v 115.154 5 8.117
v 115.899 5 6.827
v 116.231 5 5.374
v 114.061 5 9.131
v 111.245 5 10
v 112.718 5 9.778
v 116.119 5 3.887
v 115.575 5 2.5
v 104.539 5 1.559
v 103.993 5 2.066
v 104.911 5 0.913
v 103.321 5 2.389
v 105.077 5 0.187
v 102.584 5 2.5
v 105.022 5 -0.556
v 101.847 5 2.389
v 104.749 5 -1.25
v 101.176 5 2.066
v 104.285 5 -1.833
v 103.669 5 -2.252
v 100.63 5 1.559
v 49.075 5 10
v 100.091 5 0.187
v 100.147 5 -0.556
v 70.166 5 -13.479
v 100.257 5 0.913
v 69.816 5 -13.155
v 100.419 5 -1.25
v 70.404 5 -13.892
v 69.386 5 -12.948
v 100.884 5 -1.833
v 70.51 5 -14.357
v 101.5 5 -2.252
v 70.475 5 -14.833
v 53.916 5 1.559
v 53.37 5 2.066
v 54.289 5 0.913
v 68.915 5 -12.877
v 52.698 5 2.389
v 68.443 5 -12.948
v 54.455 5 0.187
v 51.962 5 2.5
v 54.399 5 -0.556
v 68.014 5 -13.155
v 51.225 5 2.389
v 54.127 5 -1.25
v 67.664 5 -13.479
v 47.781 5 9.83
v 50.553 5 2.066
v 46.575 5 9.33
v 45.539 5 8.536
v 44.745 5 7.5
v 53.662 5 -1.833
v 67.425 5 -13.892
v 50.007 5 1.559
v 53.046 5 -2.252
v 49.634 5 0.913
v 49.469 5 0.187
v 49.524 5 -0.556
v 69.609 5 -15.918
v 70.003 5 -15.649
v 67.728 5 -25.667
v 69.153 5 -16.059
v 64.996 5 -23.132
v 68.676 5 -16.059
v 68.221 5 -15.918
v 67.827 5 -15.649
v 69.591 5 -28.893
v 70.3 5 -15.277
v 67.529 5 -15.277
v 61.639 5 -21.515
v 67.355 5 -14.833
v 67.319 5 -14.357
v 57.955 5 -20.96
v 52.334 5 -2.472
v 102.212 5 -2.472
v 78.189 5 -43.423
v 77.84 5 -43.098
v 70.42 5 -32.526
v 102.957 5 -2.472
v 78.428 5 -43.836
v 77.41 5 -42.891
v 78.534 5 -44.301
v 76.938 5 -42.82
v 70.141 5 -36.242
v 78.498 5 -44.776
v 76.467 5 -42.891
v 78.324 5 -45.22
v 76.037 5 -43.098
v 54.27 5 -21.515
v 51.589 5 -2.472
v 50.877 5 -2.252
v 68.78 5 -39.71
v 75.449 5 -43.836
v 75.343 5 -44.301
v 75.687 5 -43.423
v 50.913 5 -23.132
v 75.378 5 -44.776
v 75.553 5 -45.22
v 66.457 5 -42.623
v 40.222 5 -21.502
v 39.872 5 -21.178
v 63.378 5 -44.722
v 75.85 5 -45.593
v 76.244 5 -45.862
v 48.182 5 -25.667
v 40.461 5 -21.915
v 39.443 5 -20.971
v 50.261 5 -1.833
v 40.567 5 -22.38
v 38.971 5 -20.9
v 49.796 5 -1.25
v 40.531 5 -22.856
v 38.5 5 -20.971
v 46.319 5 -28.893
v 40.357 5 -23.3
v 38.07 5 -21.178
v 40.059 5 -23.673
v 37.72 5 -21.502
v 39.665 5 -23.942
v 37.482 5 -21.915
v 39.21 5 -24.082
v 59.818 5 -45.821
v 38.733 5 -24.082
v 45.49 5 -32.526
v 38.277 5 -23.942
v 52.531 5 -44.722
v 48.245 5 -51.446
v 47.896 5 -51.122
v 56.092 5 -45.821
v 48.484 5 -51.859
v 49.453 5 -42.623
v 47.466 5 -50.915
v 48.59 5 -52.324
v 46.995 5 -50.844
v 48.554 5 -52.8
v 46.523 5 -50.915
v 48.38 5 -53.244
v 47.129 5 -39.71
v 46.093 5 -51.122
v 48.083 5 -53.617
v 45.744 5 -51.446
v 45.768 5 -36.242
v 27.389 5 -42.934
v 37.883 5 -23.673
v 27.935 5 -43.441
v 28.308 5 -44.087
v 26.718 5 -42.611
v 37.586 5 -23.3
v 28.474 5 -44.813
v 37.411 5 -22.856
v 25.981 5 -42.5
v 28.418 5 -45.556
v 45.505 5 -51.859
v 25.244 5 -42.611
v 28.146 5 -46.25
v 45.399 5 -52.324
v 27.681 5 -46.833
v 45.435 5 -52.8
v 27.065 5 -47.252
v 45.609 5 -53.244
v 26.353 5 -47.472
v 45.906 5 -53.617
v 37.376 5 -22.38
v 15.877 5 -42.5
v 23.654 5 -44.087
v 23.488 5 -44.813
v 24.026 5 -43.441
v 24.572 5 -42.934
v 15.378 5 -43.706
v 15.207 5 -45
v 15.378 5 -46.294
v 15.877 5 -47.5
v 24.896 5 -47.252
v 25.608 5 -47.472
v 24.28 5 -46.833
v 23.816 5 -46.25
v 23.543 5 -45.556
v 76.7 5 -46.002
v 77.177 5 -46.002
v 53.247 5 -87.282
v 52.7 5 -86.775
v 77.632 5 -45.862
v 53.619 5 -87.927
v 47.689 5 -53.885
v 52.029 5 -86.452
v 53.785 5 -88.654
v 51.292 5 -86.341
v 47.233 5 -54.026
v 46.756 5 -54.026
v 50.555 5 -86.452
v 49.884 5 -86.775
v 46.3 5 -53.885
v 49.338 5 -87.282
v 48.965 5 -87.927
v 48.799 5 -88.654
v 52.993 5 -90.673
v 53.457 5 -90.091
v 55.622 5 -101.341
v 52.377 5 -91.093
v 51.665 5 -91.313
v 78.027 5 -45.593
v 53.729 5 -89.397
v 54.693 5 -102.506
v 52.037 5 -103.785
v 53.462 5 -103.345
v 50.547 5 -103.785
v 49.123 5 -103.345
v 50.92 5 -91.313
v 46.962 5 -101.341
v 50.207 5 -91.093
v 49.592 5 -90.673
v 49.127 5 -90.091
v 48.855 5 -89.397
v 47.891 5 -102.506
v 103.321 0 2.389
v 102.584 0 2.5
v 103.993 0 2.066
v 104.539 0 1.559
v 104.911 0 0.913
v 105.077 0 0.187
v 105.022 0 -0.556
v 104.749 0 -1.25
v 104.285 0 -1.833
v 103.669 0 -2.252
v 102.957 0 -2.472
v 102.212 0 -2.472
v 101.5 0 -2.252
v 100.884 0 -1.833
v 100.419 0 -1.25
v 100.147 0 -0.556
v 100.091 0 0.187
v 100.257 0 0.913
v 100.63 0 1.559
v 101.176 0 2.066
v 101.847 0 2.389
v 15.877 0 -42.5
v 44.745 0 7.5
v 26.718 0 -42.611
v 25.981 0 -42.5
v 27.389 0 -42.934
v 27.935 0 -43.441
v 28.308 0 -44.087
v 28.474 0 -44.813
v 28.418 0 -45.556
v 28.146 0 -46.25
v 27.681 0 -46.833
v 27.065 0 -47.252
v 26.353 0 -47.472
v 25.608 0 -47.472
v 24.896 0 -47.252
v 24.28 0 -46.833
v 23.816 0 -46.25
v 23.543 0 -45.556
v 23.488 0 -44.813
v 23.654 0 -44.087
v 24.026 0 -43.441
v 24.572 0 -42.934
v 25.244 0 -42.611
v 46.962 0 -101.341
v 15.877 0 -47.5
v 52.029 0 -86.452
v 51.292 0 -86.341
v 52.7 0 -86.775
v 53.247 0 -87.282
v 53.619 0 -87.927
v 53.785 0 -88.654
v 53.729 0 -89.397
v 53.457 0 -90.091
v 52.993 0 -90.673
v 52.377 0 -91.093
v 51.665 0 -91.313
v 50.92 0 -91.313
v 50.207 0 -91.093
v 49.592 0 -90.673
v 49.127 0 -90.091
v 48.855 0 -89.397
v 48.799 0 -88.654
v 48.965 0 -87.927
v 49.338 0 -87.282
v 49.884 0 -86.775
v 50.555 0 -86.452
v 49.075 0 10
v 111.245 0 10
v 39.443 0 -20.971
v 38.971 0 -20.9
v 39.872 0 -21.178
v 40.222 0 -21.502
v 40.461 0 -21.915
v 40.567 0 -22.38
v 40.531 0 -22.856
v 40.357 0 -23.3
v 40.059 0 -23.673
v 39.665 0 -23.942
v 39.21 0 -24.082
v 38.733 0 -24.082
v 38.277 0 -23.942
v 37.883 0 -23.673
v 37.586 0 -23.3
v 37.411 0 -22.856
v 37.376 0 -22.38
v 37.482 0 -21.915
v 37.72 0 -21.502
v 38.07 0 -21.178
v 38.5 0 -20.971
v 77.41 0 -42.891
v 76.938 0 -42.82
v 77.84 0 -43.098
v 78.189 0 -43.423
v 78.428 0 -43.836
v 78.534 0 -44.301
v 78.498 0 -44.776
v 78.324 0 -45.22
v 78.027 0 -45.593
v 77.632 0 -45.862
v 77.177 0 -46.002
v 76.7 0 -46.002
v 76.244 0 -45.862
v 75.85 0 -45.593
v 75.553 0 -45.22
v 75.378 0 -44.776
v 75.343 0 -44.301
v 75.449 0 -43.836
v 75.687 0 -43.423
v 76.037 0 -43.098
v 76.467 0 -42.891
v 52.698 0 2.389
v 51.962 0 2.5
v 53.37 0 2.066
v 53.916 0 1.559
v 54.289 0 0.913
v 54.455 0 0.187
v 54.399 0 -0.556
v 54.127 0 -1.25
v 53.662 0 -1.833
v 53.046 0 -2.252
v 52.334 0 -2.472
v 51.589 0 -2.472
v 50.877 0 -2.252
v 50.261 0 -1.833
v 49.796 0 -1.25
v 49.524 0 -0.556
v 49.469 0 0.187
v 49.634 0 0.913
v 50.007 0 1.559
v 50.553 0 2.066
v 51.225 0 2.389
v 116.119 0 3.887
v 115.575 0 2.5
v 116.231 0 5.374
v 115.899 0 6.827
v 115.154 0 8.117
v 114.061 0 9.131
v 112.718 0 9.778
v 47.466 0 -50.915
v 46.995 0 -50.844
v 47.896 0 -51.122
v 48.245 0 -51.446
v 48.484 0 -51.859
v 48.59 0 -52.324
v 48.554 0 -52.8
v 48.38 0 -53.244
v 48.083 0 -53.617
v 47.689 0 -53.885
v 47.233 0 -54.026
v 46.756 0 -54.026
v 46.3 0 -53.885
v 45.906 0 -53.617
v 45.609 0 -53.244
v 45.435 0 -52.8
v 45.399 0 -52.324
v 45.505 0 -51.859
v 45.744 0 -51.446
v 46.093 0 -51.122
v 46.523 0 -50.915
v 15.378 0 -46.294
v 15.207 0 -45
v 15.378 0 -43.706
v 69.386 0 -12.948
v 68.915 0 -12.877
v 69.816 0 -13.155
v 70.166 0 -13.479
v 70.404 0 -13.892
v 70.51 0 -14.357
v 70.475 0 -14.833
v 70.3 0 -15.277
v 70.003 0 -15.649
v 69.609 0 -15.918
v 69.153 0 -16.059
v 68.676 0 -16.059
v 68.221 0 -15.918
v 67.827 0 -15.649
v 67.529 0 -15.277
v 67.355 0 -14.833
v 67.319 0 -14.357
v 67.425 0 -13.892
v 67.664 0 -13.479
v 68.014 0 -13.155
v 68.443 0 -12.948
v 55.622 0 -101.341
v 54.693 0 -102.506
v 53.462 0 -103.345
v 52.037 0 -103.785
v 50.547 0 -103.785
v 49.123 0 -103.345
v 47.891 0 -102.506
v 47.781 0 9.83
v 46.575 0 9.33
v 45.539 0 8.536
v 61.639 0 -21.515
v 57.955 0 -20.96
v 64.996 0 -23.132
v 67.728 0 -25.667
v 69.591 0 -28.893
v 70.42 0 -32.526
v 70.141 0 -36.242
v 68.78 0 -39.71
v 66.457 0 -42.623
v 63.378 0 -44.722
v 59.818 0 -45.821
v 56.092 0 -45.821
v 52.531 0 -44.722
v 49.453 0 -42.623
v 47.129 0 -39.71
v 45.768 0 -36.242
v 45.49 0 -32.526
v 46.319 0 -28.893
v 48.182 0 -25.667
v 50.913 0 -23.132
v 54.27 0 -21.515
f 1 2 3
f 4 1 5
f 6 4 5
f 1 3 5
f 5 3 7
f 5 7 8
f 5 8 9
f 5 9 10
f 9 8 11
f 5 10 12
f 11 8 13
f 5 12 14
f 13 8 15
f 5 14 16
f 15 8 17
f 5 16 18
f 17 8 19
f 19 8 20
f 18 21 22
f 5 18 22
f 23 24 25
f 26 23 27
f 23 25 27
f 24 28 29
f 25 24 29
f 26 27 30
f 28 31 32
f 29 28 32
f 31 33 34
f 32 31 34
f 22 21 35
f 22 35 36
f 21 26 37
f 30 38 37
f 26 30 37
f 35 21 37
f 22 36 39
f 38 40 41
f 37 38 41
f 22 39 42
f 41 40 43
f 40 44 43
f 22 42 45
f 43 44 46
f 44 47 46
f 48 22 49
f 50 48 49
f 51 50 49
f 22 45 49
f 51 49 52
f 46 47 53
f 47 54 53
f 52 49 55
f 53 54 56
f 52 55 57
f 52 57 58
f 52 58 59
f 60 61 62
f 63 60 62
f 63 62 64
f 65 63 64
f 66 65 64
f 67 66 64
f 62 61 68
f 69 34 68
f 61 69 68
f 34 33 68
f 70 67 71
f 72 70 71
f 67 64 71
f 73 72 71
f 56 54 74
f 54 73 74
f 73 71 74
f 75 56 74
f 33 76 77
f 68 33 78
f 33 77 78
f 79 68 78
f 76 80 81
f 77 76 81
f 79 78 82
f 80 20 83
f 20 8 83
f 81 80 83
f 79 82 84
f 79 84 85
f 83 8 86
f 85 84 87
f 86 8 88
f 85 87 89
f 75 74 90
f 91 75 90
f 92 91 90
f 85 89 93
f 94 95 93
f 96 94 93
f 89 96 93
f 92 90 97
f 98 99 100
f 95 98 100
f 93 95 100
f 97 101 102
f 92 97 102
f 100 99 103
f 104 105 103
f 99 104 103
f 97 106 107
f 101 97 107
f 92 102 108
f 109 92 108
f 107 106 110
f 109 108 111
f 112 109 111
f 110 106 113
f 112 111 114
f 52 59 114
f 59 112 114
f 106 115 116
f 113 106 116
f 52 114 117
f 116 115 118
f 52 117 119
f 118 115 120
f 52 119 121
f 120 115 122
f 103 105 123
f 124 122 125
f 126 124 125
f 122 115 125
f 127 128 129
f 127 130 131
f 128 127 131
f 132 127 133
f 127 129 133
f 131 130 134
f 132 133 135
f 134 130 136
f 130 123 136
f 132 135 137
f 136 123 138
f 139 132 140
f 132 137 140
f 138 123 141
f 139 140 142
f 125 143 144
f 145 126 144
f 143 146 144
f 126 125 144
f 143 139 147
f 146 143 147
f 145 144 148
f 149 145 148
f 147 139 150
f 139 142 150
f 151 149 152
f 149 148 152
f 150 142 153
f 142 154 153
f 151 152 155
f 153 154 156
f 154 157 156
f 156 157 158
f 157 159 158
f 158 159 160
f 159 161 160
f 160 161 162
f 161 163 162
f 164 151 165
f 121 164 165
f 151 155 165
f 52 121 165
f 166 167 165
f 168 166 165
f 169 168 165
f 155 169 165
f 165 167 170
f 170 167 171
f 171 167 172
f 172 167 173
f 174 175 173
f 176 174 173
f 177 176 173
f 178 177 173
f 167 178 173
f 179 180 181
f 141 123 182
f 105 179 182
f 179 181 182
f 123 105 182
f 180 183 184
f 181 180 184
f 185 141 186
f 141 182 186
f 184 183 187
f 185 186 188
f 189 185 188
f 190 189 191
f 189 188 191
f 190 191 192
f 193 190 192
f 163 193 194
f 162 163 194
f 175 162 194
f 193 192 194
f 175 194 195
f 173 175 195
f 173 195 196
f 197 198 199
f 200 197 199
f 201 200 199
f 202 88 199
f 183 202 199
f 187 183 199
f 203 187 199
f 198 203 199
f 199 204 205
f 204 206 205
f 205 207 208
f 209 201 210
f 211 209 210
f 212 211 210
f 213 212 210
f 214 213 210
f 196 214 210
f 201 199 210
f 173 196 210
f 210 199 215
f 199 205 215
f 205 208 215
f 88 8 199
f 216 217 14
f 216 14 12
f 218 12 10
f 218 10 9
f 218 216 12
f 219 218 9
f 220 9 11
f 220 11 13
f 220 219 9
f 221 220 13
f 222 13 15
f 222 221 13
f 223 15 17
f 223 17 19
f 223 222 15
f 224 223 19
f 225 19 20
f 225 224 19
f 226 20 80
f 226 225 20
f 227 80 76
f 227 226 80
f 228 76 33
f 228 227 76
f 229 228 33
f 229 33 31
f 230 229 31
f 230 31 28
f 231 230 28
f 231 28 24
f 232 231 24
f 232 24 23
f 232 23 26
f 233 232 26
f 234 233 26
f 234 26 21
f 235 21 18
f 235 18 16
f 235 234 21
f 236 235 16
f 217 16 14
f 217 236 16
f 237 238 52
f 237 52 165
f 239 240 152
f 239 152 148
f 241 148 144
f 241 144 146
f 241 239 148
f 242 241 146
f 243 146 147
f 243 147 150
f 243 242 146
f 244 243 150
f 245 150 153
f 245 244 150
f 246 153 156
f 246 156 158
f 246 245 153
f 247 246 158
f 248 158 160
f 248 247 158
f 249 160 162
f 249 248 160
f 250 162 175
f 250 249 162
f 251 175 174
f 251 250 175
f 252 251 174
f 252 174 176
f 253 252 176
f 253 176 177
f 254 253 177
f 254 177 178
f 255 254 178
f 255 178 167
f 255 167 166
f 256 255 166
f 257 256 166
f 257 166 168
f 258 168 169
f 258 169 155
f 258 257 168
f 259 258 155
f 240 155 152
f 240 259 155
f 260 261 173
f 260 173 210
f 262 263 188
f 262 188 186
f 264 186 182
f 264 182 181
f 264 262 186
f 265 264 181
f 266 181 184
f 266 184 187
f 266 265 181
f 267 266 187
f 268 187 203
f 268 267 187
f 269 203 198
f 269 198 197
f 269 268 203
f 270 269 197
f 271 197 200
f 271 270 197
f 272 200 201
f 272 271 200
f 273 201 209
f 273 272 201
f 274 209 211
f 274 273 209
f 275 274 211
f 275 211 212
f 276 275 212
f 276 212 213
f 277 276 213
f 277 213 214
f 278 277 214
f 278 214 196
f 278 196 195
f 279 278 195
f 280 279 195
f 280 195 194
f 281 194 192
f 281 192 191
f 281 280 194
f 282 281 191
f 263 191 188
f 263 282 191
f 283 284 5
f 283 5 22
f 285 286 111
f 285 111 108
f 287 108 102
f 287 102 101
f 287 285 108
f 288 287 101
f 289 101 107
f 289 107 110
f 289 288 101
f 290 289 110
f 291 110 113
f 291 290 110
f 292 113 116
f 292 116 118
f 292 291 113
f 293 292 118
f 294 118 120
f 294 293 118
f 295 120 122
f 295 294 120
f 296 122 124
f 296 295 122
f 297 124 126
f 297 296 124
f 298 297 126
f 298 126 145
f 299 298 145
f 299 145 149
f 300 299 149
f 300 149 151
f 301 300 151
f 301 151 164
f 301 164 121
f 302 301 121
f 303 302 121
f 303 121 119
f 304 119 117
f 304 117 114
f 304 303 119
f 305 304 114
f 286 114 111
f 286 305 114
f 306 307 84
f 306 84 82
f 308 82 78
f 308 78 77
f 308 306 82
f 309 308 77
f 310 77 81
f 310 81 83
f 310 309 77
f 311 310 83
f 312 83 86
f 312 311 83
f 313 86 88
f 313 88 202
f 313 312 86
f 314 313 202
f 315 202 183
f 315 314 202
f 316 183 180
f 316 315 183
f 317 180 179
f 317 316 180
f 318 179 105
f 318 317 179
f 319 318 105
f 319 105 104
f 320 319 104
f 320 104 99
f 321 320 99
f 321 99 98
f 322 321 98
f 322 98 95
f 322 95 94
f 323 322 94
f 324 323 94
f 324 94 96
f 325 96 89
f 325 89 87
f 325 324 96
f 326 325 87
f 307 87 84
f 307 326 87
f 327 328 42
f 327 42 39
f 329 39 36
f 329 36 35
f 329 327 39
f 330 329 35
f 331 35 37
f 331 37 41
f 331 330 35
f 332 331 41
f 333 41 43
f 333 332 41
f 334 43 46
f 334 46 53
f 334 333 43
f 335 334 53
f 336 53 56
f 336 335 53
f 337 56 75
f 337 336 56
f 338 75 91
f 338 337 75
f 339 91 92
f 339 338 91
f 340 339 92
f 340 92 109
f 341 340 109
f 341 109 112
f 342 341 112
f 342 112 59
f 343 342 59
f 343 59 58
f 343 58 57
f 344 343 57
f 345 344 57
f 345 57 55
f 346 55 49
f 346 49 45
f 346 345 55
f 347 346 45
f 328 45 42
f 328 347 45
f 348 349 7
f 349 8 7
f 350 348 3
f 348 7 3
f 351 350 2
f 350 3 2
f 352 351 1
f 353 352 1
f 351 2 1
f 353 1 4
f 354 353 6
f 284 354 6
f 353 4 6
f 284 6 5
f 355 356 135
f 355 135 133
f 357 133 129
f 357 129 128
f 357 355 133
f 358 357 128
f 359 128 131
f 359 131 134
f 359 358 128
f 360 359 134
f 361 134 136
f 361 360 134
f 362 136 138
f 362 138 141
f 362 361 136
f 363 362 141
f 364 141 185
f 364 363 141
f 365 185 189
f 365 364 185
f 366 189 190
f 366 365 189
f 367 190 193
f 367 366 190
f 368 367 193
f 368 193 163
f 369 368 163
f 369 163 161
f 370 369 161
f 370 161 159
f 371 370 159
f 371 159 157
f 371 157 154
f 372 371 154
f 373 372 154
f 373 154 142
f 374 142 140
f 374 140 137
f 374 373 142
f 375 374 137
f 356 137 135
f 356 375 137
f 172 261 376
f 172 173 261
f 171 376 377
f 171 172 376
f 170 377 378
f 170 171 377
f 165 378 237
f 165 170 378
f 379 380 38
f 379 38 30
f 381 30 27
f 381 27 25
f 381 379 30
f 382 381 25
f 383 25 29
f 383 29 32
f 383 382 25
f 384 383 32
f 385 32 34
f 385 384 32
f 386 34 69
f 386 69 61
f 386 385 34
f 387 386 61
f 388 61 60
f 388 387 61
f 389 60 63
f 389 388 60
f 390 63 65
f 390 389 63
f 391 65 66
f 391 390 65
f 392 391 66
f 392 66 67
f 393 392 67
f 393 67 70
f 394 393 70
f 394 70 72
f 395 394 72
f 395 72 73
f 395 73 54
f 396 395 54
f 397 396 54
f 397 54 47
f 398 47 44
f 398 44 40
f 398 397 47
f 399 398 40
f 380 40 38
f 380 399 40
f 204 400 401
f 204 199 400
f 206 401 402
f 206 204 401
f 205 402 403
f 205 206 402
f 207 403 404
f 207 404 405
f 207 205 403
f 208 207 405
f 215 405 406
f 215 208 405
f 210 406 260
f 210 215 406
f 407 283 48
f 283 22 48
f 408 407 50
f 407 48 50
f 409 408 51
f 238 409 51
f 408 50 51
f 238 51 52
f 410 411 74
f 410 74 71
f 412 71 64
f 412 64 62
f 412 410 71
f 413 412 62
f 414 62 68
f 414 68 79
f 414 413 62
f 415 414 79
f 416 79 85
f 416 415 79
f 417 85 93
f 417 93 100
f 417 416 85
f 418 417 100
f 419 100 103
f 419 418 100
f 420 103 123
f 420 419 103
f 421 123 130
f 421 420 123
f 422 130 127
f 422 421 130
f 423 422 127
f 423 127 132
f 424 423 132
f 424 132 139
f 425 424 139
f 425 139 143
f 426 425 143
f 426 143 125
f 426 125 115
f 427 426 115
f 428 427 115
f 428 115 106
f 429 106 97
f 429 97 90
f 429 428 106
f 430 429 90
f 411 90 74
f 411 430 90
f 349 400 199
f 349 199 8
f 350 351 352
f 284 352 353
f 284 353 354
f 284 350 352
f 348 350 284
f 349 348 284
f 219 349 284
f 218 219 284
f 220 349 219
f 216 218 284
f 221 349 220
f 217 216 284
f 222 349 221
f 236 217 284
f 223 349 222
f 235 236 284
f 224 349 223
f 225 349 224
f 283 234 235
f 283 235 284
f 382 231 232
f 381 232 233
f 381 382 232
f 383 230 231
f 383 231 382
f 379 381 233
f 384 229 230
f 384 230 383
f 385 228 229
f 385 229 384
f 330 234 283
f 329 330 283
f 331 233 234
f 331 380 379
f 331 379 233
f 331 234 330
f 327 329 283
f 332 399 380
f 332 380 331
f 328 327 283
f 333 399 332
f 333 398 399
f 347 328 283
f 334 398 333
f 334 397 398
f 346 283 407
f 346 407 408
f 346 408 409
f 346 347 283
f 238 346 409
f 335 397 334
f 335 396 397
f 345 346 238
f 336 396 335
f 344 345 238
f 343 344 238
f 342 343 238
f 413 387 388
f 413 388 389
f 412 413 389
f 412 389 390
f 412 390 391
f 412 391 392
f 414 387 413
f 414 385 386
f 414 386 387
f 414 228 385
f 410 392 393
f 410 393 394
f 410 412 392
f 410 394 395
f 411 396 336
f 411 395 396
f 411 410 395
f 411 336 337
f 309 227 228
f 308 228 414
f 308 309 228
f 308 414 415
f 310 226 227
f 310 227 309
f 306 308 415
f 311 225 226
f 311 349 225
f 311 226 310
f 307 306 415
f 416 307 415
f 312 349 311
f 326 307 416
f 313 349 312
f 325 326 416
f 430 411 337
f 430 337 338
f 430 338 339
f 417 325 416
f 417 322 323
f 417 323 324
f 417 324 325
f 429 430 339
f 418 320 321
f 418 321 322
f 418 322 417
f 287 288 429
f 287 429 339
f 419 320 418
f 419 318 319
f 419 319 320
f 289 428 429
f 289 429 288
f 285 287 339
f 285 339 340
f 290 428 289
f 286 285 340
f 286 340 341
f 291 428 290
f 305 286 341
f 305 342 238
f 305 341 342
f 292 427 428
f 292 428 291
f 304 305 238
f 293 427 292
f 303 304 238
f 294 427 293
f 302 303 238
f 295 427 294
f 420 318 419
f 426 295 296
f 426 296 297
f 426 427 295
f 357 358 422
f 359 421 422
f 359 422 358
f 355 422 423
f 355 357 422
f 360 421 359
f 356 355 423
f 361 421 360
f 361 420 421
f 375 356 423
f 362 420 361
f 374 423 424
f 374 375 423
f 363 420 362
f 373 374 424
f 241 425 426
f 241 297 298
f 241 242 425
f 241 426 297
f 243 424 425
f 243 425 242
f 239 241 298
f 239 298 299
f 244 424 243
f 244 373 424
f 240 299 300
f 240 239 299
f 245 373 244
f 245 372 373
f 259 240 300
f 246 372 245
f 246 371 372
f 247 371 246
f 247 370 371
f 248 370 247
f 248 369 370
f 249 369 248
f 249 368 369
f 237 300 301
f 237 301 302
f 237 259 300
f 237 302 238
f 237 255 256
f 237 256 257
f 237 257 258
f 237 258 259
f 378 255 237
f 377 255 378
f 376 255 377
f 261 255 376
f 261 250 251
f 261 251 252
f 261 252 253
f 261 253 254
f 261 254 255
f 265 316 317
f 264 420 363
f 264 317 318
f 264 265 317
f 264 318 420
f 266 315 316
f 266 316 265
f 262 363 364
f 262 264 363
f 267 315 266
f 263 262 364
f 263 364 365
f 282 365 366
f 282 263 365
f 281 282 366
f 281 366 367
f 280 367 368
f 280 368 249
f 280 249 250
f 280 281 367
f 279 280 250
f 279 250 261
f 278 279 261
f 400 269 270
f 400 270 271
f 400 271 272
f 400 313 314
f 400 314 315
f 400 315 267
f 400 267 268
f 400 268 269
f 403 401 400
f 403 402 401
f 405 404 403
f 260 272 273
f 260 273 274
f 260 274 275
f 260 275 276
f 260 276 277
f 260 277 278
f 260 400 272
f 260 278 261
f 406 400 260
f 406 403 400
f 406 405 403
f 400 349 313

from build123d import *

# Parameters (mm, degrees)
CROQUIS1_R              = 2.5
CROQUIS1_R_2            = 1.6
CROQUIS1_R_3            = 12.5
SALIENTE_EXTRUIR1_DEPTH = 5
REDONDEO1_R             = 5


with BuildPart() as part:
    # Croquis1 → Saliente-Extruir1 (new body)
    with BuildSketch(Plane(origin=(0, 0, 0), x_dir=(1, 0, 0), z_dir=(0, 1, 0))):
        Polygon((51.292156122, 108.840620434), (119.90482032, -10), (46.188021535, -10), (14.43375673, 45), align=None)
        with Locations(Location((51.292156122, 88.840620434, 0), (0, 0, 270))):
            Circle(CROQUIS1_R, mode=Mode.SUBTRACT)
        with Locations(Location((102.584312245, 0, 0), (0, 0, 270))):
            Circle(CROQUIS1_R, mode=Mode.SUBTRACT)
        with Locations(Location((51.961524227, 0, 0), (0, 0, 270))):
            Circle(CROQUIS1_R, mode=Mode.SUBTRACT)
        with Locations(Location((25.980762114, 45, 0), (0, 0, 270))):
            Circle(CROQUIS1_R, mode=Mode.SUBTRACT)
        with Locations(Location((38.97114317, 22.5, 0), (0, 0, 270))):
            Circle(CROQUIS1_R_2, mode=Mode.SUBTRACT)
        with Locations(Location((46.994533568, 52.443700615, 0), (0, 0, 270))):
            Circle(CROQUIS1_R_2, mode=Mode.SUBTRACT)
        with Locations(Location((76.938234183, 44.420310217, 0), (0, 0, 270))):
            Circle(CROQUIS1_R_2, mode=Mode.SUBTRACT)
        with Locations(Location((68.914843785, 14.476609602, 0), (0, 0, 270))):
            Circle(CROQUIS1_R_2, mode=Mode.SUBTRACT)
        with Locations(Location((57.954688677, 33.460155108, 0), (0, 0, 270))):
            Circle(CROQUIS1_R_3, mode=Mode.SUBTRACT)
    extrude(amount=SALIENTE_EXTRUIR1_DEPTH)

    # Redondeo1
    redondeo1_edges = [part.edges().sort_by_distance(p)[0] for p in [
        (51.292156122, 2.5, -108.840620434),
        (119.90482032, 2.5, 10),
        (46.188021535, 2.5, 10),
        (14.43375673, 2.5, -45),
    ]]
    fillet(redondeo1_edges, radius=REDONDEO1_R)


solid = part.part
